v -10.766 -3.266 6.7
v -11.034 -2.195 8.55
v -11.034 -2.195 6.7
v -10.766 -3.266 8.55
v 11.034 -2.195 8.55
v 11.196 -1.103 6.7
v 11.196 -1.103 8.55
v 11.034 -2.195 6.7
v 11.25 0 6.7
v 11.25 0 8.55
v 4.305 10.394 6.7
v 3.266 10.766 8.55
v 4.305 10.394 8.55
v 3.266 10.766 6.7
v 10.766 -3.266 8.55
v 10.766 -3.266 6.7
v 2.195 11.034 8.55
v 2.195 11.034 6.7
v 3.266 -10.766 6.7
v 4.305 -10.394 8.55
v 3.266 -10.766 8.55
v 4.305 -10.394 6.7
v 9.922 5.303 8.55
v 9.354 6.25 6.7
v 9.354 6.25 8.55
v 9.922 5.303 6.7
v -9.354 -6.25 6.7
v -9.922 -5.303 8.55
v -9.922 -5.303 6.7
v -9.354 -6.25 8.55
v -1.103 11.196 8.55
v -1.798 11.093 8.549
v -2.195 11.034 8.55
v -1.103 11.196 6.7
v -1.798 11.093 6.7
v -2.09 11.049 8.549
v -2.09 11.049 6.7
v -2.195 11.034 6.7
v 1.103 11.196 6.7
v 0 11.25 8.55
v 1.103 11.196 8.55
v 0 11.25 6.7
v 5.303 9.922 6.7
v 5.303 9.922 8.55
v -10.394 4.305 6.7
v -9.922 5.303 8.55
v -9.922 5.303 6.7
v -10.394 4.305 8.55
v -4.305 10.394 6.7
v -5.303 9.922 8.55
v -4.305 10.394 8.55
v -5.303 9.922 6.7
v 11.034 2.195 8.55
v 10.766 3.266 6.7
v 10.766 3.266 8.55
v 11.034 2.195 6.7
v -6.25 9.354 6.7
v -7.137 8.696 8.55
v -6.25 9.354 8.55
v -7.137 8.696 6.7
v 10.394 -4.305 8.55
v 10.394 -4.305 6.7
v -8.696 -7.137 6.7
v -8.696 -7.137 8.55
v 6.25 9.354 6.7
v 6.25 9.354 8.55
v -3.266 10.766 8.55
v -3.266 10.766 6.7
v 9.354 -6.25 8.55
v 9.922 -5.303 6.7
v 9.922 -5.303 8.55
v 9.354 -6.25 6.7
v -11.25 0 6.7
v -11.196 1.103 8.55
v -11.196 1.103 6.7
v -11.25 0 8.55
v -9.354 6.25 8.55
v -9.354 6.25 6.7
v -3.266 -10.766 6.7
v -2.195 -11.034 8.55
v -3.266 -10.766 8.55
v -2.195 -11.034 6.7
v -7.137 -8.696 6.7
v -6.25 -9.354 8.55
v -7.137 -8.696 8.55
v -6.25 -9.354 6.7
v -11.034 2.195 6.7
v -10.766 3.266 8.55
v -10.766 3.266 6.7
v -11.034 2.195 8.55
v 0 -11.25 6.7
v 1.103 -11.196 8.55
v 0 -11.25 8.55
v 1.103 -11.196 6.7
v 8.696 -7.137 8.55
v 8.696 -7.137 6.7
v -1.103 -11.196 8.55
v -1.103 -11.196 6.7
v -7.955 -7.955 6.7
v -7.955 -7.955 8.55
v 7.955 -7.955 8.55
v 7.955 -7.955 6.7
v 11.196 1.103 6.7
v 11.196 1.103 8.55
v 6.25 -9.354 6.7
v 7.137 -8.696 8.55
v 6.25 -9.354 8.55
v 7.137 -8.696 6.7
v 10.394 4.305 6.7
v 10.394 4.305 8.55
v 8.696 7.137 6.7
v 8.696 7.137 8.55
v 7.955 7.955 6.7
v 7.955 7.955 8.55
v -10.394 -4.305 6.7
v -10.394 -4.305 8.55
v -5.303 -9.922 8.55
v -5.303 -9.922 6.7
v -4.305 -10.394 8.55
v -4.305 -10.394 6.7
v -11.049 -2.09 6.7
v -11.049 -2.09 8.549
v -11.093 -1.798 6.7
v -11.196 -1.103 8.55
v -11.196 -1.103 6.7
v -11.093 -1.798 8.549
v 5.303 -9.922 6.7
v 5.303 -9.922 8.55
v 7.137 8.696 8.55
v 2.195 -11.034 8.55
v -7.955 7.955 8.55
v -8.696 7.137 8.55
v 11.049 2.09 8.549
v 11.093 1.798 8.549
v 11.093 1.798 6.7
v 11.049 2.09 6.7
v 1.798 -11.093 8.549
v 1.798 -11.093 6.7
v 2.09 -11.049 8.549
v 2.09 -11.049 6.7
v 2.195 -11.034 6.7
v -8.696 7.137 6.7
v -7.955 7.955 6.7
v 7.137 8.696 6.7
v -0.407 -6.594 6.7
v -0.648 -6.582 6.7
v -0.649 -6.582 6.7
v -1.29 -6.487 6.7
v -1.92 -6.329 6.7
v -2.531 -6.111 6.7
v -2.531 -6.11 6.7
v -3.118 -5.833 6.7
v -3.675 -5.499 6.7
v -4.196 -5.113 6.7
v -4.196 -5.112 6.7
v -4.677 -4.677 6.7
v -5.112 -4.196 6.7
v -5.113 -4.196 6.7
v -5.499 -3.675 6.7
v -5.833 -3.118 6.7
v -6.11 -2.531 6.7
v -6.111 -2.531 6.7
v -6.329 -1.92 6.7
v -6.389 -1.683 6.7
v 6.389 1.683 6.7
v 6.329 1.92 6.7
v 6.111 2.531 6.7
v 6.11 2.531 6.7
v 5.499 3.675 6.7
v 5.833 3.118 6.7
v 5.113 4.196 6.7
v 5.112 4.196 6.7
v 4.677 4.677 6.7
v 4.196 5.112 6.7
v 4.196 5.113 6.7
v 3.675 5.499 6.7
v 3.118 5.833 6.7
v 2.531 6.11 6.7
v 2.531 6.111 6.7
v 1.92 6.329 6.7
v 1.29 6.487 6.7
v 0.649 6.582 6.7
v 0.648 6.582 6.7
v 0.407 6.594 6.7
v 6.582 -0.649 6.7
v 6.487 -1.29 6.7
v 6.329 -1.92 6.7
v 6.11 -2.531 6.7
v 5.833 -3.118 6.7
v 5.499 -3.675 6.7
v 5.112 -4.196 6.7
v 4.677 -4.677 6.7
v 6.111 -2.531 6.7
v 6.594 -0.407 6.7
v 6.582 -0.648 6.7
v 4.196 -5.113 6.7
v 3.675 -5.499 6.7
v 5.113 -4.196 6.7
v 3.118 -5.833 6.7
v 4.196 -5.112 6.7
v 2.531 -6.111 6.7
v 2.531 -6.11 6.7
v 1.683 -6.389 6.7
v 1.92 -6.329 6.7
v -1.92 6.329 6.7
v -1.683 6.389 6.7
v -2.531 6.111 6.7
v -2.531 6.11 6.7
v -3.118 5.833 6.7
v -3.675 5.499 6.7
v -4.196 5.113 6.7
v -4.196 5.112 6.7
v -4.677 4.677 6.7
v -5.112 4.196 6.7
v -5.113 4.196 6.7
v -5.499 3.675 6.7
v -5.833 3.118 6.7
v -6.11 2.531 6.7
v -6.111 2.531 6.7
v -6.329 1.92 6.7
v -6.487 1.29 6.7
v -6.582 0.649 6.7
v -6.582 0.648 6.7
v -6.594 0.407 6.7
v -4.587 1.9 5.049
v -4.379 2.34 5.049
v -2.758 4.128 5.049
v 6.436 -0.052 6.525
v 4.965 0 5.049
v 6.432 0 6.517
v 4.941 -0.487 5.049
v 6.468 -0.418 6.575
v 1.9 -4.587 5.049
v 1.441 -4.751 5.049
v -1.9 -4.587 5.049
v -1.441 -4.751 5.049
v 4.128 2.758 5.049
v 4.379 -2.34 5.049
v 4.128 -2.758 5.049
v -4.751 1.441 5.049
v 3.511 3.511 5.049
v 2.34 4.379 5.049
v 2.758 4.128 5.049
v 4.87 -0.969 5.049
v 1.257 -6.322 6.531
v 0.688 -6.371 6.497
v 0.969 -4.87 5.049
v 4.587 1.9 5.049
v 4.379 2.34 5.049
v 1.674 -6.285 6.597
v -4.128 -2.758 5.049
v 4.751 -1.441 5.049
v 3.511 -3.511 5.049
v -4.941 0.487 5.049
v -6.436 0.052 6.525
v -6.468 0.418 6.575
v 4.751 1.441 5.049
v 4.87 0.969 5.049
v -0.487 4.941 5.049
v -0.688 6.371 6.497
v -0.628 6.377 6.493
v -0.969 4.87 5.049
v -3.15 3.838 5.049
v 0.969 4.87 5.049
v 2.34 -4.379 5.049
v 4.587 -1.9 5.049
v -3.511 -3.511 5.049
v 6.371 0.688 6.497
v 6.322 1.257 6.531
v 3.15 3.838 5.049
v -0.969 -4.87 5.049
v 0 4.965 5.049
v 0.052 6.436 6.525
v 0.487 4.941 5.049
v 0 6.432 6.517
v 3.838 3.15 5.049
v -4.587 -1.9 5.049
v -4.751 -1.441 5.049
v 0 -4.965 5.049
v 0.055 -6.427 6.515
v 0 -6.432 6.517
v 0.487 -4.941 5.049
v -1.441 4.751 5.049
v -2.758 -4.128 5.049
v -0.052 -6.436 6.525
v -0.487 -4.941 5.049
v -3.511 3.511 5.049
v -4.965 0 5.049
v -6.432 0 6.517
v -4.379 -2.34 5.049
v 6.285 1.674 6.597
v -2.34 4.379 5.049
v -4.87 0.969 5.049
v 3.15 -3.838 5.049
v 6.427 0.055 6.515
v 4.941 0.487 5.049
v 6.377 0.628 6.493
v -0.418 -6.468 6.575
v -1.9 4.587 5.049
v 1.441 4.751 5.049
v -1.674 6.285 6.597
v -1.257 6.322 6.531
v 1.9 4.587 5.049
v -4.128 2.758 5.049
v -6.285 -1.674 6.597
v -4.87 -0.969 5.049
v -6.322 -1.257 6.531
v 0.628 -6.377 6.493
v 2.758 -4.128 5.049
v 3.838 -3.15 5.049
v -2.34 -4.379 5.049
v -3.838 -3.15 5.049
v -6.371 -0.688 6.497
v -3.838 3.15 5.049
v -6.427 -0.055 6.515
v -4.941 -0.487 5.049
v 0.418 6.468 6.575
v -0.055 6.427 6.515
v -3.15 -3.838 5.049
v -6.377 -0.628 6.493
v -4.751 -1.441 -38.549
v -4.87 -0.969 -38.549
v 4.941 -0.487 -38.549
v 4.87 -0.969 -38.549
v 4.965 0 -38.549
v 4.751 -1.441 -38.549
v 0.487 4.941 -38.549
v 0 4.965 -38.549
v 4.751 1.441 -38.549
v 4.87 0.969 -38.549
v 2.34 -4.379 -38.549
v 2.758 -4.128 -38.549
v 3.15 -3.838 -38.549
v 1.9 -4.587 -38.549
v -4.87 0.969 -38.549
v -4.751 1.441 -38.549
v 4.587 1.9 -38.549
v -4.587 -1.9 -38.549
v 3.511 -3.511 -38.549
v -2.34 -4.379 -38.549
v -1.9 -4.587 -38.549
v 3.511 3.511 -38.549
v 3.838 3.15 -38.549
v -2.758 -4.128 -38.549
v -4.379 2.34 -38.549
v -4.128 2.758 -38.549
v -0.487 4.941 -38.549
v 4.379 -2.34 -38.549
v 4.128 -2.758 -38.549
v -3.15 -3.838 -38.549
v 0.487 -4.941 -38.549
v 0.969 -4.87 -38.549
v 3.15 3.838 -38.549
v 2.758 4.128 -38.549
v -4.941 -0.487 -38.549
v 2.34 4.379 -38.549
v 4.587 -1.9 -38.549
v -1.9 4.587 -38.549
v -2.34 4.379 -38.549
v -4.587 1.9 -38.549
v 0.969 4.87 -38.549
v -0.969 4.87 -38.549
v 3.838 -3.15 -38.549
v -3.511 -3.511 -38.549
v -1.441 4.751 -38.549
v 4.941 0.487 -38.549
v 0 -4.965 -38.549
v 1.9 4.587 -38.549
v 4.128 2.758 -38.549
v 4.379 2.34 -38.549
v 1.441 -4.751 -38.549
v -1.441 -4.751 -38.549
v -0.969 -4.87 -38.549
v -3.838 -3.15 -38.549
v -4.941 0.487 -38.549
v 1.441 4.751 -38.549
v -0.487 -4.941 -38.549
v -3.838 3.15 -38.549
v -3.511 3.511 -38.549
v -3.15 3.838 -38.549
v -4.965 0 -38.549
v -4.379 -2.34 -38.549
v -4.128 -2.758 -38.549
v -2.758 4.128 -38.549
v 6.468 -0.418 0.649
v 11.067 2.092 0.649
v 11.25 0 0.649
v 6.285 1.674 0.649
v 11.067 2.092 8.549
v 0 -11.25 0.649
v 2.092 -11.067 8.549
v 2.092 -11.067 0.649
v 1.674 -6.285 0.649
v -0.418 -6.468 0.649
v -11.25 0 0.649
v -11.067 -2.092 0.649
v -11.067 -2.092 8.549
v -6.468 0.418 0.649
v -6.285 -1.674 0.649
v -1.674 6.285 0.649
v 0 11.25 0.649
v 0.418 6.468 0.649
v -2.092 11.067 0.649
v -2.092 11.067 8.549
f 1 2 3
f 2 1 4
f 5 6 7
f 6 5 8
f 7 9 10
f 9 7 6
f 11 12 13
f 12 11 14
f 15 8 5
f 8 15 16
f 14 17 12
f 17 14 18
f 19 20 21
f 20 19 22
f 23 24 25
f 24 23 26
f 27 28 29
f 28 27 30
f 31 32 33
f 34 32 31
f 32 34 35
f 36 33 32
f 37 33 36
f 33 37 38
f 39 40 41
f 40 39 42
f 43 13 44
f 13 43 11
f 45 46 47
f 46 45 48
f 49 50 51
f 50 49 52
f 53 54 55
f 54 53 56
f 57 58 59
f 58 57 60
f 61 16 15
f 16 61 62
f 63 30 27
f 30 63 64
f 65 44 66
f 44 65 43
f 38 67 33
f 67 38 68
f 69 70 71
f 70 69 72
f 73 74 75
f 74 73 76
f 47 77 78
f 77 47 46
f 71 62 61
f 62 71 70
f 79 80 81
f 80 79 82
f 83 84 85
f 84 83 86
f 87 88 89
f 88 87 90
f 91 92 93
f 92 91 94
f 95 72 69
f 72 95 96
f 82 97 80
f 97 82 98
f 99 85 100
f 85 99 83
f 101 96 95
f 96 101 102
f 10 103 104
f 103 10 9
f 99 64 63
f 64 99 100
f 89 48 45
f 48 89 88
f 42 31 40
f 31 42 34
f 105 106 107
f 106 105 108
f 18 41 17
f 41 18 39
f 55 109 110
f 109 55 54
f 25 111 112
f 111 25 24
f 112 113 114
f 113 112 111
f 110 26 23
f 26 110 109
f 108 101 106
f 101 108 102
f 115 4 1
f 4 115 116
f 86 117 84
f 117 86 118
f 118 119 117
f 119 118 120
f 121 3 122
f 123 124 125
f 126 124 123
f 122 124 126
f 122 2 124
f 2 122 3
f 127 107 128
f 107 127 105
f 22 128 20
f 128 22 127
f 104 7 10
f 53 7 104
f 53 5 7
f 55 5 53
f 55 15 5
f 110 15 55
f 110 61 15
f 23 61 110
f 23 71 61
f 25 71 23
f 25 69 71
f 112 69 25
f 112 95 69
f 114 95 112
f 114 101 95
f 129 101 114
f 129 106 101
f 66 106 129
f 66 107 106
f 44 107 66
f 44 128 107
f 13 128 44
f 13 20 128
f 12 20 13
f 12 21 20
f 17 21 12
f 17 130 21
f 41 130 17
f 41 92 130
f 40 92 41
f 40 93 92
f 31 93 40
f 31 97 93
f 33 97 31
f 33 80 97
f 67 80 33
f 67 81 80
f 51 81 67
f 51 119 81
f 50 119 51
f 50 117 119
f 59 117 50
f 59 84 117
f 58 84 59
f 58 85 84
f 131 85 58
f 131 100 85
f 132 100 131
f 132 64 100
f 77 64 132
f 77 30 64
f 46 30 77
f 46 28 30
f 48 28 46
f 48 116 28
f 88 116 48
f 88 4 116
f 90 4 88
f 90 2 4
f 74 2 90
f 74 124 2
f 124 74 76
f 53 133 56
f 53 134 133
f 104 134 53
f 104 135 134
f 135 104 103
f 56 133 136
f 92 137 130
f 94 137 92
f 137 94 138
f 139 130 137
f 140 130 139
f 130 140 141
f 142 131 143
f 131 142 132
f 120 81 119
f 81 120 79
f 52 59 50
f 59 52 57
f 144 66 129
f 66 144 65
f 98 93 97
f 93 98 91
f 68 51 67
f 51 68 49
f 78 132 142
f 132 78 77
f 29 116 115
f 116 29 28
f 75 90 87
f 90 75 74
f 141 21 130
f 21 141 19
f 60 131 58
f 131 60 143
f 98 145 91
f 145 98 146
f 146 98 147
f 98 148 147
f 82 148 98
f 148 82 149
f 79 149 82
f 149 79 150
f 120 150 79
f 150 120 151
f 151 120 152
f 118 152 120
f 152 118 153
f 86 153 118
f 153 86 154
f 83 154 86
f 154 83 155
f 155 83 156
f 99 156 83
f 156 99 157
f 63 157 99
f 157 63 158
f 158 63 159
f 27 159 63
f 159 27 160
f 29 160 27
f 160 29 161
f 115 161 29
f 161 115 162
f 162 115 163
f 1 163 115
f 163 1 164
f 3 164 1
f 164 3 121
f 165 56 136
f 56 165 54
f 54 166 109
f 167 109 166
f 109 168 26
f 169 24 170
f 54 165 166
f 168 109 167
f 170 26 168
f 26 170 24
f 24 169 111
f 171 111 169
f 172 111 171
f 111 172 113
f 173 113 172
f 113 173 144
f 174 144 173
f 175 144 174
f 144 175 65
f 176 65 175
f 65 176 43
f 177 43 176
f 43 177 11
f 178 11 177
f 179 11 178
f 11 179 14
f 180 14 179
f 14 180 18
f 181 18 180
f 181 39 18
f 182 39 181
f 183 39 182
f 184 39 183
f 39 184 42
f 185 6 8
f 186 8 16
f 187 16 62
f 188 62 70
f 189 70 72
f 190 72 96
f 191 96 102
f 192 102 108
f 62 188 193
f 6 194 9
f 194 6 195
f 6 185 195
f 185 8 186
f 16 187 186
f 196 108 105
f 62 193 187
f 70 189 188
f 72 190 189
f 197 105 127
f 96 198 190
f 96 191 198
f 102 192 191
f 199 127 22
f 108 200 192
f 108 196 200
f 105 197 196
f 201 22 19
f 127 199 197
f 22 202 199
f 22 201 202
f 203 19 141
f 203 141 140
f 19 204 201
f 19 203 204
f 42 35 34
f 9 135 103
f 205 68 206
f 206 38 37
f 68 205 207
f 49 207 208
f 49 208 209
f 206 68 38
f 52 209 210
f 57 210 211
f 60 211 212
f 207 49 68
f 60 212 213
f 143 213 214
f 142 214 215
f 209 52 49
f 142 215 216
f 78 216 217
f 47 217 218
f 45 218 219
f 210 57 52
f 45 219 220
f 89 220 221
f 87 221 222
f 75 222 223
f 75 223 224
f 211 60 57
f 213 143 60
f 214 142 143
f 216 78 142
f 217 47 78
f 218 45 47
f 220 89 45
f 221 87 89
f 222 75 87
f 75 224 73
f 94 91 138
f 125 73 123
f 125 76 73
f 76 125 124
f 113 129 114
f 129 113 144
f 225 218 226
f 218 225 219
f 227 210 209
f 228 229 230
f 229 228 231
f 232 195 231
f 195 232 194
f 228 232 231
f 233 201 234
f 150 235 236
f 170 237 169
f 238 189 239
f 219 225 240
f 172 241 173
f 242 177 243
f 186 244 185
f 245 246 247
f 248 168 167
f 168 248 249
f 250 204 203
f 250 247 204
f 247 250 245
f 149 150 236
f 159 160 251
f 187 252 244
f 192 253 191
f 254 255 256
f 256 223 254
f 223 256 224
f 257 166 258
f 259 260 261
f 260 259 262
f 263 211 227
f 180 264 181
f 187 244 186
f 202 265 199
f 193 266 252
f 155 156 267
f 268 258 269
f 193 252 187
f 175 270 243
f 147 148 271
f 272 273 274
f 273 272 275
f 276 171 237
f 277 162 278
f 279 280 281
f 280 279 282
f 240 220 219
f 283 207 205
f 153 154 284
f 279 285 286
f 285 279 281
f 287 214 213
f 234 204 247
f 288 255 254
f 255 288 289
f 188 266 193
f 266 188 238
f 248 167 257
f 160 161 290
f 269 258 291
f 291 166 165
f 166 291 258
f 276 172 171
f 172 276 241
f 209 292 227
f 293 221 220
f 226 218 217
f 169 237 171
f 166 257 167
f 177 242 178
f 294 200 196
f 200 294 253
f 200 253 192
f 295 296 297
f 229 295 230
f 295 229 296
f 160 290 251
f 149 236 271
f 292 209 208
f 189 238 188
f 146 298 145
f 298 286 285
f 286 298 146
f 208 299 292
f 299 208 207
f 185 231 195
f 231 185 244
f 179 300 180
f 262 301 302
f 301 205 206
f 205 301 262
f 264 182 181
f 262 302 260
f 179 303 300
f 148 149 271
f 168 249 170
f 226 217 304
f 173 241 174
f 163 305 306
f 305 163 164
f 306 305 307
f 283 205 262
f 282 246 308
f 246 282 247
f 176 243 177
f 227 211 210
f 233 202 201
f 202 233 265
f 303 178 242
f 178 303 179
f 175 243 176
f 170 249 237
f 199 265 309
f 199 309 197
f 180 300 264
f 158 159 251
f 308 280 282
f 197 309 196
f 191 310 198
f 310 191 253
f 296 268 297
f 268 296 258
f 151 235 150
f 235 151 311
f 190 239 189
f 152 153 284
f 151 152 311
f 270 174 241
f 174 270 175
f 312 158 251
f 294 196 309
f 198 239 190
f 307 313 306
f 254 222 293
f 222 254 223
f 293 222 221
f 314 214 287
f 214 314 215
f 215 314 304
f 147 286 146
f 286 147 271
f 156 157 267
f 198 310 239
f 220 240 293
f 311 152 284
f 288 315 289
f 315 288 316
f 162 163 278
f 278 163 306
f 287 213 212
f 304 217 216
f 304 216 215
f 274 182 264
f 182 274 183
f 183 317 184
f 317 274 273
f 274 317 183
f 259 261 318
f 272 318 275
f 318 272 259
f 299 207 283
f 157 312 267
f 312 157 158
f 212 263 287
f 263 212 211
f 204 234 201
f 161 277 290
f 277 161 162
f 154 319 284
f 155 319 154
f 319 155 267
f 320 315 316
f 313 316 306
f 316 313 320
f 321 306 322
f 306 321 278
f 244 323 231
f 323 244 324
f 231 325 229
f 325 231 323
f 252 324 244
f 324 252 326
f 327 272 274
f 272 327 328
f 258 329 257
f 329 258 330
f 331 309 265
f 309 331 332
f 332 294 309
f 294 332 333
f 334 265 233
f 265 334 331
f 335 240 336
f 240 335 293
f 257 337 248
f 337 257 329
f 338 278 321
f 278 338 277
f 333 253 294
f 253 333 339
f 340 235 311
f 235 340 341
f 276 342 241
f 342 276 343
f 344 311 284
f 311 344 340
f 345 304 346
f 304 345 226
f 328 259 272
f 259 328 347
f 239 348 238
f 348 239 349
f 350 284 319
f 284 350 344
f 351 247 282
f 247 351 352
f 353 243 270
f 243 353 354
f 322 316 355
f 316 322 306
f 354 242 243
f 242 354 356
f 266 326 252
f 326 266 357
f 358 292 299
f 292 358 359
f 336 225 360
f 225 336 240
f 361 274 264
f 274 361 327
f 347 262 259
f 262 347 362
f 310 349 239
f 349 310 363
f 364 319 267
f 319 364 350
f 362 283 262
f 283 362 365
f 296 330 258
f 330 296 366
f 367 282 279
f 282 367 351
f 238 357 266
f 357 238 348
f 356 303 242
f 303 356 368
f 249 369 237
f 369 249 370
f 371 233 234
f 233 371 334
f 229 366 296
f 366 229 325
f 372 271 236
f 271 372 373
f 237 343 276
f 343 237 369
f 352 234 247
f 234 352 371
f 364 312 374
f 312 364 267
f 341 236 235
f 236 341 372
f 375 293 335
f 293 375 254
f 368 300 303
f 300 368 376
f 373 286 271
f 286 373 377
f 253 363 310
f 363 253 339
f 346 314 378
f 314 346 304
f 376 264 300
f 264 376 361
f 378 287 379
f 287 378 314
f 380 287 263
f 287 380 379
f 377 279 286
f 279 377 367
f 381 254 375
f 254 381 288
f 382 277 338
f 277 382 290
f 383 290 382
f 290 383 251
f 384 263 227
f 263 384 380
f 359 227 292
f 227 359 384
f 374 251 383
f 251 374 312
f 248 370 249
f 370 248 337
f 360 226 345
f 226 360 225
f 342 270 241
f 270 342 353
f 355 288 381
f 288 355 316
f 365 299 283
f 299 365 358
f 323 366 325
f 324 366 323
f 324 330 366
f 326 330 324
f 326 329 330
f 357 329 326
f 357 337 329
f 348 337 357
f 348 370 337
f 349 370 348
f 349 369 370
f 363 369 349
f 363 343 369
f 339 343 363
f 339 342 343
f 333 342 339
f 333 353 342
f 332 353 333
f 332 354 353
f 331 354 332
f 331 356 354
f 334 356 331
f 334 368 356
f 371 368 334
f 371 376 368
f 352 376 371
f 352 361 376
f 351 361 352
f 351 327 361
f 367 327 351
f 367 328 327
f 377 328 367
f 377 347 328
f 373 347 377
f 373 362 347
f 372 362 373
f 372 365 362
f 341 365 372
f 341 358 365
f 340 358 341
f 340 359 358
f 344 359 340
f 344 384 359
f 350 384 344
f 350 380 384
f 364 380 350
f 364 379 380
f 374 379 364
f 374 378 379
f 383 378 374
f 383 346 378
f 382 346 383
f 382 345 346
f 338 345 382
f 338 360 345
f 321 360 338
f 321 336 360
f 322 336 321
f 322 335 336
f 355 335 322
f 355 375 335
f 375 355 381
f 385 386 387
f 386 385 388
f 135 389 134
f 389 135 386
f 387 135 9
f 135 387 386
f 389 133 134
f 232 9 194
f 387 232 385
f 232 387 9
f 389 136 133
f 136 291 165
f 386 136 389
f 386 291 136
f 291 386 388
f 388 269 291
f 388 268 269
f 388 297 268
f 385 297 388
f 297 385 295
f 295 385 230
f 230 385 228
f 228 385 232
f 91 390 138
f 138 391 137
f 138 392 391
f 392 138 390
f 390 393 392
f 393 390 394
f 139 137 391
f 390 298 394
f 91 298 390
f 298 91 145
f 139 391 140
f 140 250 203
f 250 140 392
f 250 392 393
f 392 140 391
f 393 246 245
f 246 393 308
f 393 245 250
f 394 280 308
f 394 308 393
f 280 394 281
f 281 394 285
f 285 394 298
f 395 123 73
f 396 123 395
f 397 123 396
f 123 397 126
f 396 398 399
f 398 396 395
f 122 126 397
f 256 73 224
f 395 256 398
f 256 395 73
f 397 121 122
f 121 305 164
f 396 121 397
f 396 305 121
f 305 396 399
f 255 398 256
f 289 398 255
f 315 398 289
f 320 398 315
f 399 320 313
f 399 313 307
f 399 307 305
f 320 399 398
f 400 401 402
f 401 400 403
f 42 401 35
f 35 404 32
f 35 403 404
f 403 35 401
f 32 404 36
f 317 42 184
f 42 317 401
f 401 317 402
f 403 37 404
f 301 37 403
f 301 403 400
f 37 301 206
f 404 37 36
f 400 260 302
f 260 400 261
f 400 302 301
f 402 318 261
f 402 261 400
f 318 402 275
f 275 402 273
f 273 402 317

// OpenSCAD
// Start: lazy_union
default_5_default_5();
// End: lazy_union

// Modules.

// 'PartMaterial undef-default - default 5.0'
module default_5_default_5() {
  // 'None : _combine_solids_and_holes'
  union() {
    // 'default : _combine_solids_and_holes'
    union() {
      // 'tnut'
      multmatrix(m=[[1.0, 0.0, 0.0, 0.0], [0.0, 1.0, 0.0, 0.0], [0.0, 0.0, 1.0, 8.55], [0.0, 0.0, 0.0, 1.0]]) {
        // 'tnut : _combine_solids_and_holes'
        union() {
          // 'flat'
          multmatrix(m=[[1.0, 0.0, 0.0, 0.0], [0.0, -1.0, 0.0, 0.0], [0.0, 0.0, -1.0, 0.0], [0.0, 0.0, 0.0, 1.0]]) {
            // 'flat : _combine_solids_and_holes'
            union() {
              // 'flat'
              cylinder(h=1.85, r1=11.25, r2=11.25, center=false, $fn=64);
            }
          }
          // 'bevel'
          multmatrix(m=[[1.0, 0.0, 0.0, 0.0], [0.0, -1.0, 0.0, 0.0], [0.0, 0.0, -1.0, -1.8490000000000002], [0.0, 0.0, 0.0, 1.0]]) {
            // 'bevel : _combine_solids_and_holes'
            union() {
              // 'bevel'
              cylinder(h=1.6519999999999997, r1=6.614999999999999, r2=4.965, center=false, $fn=64);
            }
          }
          // 'shaft'
          multmatrix(m=[[1.0, 0.0, 0.0, 0.0], [0.0, -1.0, 0.0, 0.0], [0.0, 0.0, -1.0, -3.5], [0.0, 0.0, 0.0, 1.0]]) {
            // 'shaft : _combine_solids_and_holes'
            union() {
              // 'shaft'
              cylinder(h=13.600000000000001, r1=4.965, r2=4.965, center=false, $fn=64);
            }
          }
          // 'shaft_extension'
          multmatrix(m=[[1.0, 0.0, 0.0, 0.0], [0.0, -1.0, 0.0, 0.0], [0.0, 0.0, -1.0, -17.099000000000004], [0.0, 0.0, 0.0, 1.0]]) {
            // 'shaft_extension'
            color(c=[1.0, 0.0, 0.0, 1.0]) {
              // 'shaft_extension : _combine_solids_and_holes'
              union() {
                // 'shaft_extension'
                cylinder(h=30.0, r1=4.965, r2=4.965, center=false, $fn=64);
              }
            }
          }
          // ('wing', 0)
          multmatrix(m=[[-0.9961946980917455, -0.08715574274765814, 0.0, 11.25], [-0.08715574274765814, 0.9961946980917455, 0.0, 0.0], [0.0, 0.0, -1.0, -0.001], [0.0, 0.0, 0.0, 1.0]]) {
            // ('wing', 0)
            color(c=[1.0, 0.0, 1.0, 1.0]) {
              // "('wing', 0) : _combine_solids_and_holes"
              union() {
                // ('wing', 0)
                cube(size=[4.8, 2.1, 7.9]);
              }
            }
          }
          // ('wing', 1)
          multmatrix(m=[[-0.08715574274765814, 0.9961946980917455, 0.0, 0.0], [0.9961946980917455, 0.08715574274765814, 0.0, -11.25], [0.0, 0.0, -1.0, -0.001], [0.0, 0.0, 0.0, 1.0]]) {
            // ('wing', 1)
            color(c=[1.0, 0.0, 1.0, 1.0]) {
              // "('wing', 1) : _combine_solids_and_holes"
              union() {
                // ('wing', 1)
                cube(size=[4.8, 2.1, 7.9]);
              }
            }
          }
          // ('wing', 2)
          multmatrix(m=[[0.9961946980917455, 0.08715574274765814, 0.0, -11.25], [0.08715574274765814, -0.9961946980917455, 0.0, 0.0], [0.0, 0.0, -1.0, -0.001], [0.0, 0.0, 0.0, 1.0]]) {
            // ('wing', 2)
            color(c=[1.0, 0.0, 1.0, 1.0]) {
              // "('wing', 2) : _combine_solids_and_holes"
              union() {
                // ('wing', 2)
                cube(size=[4.8, 2.1, 7.9]);
              }
            }
          }
          // ('wing', 3)
          multmatrix(m=[[0.08715574274765814, -0.9961946980917455, 0.0, 0.0], [-0.9961946980917455, -0.08715574274765814, 0.0, 11.25], [0.0, 0.0, -1.0, -0.001], [0.0, 0.0, 0.0, 1.0]]) {
            // ('wing', 3)
            color(c=[1.0, 0.0, 1.0, 1.0]) {
              // "('wing', 3) : _combine_solids_and_holes"
              union() {
                // ('wing', 3)
                cube(size=[4.8, 2.1, 7.9]);
              }
            }
          }
        }
      }
    }
  }
} // end module default_5_default_5
